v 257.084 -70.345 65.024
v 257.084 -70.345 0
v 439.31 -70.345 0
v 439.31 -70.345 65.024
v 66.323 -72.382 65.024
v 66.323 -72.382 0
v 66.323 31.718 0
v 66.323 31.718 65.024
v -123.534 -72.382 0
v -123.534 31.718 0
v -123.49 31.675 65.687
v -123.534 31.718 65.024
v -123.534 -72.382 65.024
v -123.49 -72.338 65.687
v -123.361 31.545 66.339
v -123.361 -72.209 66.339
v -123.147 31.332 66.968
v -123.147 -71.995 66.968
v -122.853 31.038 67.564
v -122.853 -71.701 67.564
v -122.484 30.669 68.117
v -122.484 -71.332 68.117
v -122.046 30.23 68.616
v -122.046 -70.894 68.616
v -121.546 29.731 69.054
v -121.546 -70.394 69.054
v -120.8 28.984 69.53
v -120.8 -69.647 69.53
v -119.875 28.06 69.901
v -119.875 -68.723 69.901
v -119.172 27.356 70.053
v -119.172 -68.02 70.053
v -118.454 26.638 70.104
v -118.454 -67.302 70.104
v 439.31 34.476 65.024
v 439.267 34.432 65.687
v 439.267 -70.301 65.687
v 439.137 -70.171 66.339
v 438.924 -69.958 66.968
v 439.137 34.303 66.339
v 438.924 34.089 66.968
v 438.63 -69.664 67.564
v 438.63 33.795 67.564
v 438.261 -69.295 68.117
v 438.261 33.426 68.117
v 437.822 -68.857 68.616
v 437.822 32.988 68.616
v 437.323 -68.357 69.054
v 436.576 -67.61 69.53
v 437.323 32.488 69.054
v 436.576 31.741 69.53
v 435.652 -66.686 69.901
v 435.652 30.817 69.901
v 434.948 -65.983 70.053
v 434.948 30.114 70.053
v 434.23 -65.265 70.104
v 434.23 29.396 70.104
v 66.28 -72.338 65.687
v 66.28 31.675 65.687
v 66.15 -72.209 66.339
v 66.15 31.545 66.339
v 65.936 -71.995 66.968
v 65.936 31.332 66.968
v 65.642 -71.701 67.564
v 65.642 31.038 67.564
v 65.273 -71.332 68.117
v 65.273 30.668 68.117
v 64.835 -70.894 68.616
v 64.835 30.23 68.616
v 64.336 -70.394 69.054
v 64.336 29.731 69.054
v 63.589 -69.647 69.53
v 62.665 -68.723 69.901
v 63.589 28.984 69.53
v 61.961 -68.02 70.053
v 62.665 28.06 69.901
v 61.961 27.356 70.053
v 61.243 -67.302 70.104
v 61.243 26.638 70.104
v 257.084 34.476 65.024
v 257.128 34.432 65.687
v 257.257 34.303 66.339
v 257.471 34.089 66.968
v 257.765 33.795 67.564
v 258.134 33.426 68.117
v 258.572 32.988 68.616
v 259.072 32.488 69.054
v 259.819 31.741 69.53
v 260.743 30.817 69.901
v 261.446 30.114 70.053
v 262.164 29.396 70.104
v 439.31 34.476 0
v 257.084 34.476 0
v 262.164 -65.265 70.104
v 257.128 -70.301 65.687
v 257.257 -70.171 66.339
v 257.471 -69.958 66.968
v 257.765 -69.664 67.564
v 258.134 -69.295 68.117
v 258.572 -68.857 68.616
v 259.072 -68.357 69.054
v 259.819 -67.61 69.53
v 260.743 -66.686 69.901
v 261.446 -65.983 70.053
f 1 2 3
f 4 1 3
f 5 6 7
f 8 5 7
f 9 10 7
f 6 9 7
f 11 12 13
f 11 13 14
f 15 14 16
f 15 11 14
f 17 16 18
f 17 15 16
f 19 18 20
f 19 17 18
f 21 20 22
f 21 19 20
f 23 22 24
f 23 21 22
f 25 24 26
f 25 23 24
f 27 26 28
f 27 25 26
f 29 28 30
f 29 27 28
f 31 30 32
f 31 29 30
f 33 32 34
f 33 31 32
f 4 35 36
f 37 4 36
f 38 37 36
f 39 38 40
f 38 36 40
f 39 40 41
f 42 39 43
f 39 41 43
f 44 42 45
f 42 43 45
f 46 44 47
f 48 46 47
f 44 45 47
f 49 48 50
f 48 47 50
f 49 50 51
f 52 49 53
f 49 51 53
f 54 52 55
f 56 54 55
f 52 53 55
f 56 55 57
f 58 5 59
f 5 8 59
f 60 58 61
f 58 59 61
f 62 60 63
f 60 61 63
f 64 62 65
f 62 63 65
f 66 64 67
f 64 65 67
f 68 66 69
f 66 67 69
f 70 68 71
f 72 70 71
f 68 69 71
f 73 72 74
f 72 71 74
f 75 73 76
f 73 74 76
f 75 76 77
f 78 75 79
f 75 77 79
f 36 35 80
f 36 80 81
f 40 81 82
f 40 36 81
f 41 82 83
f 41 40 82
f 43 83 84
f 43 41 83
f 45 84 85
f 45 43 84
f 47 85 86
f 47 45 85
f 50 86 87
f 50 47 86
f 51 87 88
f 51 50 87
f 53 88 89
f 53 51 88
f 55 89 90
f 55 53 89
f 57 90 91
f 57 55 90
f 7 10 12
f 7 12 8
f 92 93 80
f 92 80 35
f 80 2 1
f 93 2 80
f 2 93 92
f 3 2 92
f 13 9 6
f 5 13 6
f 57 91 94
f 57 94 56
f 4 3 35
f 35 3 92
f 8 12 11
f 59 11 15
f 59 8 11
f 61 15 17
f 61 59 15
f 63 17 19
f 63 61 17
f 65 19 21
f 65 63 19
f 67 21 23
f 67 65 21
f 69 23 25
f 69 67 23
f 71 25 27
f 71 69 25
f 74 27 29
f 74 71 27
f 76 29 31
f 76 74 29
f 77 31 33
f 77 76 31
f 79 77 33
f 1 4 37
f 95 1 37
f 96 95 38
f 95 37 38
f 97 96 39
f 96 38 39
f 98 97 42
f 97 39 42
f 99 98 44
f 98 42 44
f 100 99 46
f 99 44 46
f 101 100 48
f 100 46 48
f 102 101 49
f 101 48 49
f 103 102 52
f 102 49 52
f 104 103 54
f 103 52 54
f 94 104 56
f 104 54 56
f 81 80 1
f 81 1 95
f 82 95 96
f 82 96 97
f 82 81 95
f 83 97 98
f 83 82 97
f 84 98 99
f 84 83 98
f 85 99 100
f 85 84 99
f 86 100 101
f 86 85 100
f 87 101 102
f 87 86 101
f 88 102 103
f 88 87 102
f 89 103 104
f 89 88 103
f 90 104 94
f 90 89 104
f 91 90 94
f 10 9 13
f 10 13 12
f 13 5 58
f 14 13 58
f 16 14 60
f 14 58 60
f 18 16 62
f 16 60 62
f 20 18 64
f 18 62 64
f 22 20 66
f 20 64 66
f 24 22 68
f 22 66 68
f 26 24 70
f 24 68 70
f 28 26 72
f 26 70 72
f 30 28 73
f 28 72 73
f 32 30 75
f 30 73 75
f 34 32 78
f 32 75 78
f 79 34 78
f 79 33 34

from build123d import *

# Parameters (mm, degrees)
F0_W     = 189.856864
F0_H     = 104.099866
F1_DEPTH = 70.104
F2_W     = 182.226122
F2_H     = 104.820341
F3_DEPTH = 70.104
F4_R     = 5.08
F4_2_R   = 5.08


with BuildPart() as f1:
    # F0 (on Top) → F1 (new body)
    with BuildSketch(Plane.XY):
        with Locations((-28.605435, -20.331668)):
            Rectangle(F0_W, F0_H)
    extrude(amount=F1_DEPTH)

    # F4
    f4_edges = [f1.edges().sort_by_distance(p)[0] for p in [
        (-28.605435, -72.381601, 70.104),
        (66.322997, -20.331668, 70.104),
        (-28.605435, 31.718265, 70.104),
        (-123.533867, -20.331668, 70.104),
    ]]
    fillet(f4_edges, radius=F4_R)


with BuildPart() as f3:
    # F2 (on Top) → F3 (new body)
    with BuildSketch(Plane.XY):
        with Locations((348.197311, -17.934396)):
            Rectangle(F2_W, F2_H)
    extrude(amount=F3_DEPTH)

    # F4#2
    f4_2_edges = [f3.edges().sort_by_distance(p)[0] for p in [
        (257.08425, -17.934397, 70.104),
        (348.197311, -70.344567, 70.104),
        (439.310372, -17.934397, 70.104),
        (348.197311, 34.475774, 70.104),
    ]]
    fillet(f4_2_edges, radius=F4_2_R)


solid = Compound([f1.part, f3.part])
